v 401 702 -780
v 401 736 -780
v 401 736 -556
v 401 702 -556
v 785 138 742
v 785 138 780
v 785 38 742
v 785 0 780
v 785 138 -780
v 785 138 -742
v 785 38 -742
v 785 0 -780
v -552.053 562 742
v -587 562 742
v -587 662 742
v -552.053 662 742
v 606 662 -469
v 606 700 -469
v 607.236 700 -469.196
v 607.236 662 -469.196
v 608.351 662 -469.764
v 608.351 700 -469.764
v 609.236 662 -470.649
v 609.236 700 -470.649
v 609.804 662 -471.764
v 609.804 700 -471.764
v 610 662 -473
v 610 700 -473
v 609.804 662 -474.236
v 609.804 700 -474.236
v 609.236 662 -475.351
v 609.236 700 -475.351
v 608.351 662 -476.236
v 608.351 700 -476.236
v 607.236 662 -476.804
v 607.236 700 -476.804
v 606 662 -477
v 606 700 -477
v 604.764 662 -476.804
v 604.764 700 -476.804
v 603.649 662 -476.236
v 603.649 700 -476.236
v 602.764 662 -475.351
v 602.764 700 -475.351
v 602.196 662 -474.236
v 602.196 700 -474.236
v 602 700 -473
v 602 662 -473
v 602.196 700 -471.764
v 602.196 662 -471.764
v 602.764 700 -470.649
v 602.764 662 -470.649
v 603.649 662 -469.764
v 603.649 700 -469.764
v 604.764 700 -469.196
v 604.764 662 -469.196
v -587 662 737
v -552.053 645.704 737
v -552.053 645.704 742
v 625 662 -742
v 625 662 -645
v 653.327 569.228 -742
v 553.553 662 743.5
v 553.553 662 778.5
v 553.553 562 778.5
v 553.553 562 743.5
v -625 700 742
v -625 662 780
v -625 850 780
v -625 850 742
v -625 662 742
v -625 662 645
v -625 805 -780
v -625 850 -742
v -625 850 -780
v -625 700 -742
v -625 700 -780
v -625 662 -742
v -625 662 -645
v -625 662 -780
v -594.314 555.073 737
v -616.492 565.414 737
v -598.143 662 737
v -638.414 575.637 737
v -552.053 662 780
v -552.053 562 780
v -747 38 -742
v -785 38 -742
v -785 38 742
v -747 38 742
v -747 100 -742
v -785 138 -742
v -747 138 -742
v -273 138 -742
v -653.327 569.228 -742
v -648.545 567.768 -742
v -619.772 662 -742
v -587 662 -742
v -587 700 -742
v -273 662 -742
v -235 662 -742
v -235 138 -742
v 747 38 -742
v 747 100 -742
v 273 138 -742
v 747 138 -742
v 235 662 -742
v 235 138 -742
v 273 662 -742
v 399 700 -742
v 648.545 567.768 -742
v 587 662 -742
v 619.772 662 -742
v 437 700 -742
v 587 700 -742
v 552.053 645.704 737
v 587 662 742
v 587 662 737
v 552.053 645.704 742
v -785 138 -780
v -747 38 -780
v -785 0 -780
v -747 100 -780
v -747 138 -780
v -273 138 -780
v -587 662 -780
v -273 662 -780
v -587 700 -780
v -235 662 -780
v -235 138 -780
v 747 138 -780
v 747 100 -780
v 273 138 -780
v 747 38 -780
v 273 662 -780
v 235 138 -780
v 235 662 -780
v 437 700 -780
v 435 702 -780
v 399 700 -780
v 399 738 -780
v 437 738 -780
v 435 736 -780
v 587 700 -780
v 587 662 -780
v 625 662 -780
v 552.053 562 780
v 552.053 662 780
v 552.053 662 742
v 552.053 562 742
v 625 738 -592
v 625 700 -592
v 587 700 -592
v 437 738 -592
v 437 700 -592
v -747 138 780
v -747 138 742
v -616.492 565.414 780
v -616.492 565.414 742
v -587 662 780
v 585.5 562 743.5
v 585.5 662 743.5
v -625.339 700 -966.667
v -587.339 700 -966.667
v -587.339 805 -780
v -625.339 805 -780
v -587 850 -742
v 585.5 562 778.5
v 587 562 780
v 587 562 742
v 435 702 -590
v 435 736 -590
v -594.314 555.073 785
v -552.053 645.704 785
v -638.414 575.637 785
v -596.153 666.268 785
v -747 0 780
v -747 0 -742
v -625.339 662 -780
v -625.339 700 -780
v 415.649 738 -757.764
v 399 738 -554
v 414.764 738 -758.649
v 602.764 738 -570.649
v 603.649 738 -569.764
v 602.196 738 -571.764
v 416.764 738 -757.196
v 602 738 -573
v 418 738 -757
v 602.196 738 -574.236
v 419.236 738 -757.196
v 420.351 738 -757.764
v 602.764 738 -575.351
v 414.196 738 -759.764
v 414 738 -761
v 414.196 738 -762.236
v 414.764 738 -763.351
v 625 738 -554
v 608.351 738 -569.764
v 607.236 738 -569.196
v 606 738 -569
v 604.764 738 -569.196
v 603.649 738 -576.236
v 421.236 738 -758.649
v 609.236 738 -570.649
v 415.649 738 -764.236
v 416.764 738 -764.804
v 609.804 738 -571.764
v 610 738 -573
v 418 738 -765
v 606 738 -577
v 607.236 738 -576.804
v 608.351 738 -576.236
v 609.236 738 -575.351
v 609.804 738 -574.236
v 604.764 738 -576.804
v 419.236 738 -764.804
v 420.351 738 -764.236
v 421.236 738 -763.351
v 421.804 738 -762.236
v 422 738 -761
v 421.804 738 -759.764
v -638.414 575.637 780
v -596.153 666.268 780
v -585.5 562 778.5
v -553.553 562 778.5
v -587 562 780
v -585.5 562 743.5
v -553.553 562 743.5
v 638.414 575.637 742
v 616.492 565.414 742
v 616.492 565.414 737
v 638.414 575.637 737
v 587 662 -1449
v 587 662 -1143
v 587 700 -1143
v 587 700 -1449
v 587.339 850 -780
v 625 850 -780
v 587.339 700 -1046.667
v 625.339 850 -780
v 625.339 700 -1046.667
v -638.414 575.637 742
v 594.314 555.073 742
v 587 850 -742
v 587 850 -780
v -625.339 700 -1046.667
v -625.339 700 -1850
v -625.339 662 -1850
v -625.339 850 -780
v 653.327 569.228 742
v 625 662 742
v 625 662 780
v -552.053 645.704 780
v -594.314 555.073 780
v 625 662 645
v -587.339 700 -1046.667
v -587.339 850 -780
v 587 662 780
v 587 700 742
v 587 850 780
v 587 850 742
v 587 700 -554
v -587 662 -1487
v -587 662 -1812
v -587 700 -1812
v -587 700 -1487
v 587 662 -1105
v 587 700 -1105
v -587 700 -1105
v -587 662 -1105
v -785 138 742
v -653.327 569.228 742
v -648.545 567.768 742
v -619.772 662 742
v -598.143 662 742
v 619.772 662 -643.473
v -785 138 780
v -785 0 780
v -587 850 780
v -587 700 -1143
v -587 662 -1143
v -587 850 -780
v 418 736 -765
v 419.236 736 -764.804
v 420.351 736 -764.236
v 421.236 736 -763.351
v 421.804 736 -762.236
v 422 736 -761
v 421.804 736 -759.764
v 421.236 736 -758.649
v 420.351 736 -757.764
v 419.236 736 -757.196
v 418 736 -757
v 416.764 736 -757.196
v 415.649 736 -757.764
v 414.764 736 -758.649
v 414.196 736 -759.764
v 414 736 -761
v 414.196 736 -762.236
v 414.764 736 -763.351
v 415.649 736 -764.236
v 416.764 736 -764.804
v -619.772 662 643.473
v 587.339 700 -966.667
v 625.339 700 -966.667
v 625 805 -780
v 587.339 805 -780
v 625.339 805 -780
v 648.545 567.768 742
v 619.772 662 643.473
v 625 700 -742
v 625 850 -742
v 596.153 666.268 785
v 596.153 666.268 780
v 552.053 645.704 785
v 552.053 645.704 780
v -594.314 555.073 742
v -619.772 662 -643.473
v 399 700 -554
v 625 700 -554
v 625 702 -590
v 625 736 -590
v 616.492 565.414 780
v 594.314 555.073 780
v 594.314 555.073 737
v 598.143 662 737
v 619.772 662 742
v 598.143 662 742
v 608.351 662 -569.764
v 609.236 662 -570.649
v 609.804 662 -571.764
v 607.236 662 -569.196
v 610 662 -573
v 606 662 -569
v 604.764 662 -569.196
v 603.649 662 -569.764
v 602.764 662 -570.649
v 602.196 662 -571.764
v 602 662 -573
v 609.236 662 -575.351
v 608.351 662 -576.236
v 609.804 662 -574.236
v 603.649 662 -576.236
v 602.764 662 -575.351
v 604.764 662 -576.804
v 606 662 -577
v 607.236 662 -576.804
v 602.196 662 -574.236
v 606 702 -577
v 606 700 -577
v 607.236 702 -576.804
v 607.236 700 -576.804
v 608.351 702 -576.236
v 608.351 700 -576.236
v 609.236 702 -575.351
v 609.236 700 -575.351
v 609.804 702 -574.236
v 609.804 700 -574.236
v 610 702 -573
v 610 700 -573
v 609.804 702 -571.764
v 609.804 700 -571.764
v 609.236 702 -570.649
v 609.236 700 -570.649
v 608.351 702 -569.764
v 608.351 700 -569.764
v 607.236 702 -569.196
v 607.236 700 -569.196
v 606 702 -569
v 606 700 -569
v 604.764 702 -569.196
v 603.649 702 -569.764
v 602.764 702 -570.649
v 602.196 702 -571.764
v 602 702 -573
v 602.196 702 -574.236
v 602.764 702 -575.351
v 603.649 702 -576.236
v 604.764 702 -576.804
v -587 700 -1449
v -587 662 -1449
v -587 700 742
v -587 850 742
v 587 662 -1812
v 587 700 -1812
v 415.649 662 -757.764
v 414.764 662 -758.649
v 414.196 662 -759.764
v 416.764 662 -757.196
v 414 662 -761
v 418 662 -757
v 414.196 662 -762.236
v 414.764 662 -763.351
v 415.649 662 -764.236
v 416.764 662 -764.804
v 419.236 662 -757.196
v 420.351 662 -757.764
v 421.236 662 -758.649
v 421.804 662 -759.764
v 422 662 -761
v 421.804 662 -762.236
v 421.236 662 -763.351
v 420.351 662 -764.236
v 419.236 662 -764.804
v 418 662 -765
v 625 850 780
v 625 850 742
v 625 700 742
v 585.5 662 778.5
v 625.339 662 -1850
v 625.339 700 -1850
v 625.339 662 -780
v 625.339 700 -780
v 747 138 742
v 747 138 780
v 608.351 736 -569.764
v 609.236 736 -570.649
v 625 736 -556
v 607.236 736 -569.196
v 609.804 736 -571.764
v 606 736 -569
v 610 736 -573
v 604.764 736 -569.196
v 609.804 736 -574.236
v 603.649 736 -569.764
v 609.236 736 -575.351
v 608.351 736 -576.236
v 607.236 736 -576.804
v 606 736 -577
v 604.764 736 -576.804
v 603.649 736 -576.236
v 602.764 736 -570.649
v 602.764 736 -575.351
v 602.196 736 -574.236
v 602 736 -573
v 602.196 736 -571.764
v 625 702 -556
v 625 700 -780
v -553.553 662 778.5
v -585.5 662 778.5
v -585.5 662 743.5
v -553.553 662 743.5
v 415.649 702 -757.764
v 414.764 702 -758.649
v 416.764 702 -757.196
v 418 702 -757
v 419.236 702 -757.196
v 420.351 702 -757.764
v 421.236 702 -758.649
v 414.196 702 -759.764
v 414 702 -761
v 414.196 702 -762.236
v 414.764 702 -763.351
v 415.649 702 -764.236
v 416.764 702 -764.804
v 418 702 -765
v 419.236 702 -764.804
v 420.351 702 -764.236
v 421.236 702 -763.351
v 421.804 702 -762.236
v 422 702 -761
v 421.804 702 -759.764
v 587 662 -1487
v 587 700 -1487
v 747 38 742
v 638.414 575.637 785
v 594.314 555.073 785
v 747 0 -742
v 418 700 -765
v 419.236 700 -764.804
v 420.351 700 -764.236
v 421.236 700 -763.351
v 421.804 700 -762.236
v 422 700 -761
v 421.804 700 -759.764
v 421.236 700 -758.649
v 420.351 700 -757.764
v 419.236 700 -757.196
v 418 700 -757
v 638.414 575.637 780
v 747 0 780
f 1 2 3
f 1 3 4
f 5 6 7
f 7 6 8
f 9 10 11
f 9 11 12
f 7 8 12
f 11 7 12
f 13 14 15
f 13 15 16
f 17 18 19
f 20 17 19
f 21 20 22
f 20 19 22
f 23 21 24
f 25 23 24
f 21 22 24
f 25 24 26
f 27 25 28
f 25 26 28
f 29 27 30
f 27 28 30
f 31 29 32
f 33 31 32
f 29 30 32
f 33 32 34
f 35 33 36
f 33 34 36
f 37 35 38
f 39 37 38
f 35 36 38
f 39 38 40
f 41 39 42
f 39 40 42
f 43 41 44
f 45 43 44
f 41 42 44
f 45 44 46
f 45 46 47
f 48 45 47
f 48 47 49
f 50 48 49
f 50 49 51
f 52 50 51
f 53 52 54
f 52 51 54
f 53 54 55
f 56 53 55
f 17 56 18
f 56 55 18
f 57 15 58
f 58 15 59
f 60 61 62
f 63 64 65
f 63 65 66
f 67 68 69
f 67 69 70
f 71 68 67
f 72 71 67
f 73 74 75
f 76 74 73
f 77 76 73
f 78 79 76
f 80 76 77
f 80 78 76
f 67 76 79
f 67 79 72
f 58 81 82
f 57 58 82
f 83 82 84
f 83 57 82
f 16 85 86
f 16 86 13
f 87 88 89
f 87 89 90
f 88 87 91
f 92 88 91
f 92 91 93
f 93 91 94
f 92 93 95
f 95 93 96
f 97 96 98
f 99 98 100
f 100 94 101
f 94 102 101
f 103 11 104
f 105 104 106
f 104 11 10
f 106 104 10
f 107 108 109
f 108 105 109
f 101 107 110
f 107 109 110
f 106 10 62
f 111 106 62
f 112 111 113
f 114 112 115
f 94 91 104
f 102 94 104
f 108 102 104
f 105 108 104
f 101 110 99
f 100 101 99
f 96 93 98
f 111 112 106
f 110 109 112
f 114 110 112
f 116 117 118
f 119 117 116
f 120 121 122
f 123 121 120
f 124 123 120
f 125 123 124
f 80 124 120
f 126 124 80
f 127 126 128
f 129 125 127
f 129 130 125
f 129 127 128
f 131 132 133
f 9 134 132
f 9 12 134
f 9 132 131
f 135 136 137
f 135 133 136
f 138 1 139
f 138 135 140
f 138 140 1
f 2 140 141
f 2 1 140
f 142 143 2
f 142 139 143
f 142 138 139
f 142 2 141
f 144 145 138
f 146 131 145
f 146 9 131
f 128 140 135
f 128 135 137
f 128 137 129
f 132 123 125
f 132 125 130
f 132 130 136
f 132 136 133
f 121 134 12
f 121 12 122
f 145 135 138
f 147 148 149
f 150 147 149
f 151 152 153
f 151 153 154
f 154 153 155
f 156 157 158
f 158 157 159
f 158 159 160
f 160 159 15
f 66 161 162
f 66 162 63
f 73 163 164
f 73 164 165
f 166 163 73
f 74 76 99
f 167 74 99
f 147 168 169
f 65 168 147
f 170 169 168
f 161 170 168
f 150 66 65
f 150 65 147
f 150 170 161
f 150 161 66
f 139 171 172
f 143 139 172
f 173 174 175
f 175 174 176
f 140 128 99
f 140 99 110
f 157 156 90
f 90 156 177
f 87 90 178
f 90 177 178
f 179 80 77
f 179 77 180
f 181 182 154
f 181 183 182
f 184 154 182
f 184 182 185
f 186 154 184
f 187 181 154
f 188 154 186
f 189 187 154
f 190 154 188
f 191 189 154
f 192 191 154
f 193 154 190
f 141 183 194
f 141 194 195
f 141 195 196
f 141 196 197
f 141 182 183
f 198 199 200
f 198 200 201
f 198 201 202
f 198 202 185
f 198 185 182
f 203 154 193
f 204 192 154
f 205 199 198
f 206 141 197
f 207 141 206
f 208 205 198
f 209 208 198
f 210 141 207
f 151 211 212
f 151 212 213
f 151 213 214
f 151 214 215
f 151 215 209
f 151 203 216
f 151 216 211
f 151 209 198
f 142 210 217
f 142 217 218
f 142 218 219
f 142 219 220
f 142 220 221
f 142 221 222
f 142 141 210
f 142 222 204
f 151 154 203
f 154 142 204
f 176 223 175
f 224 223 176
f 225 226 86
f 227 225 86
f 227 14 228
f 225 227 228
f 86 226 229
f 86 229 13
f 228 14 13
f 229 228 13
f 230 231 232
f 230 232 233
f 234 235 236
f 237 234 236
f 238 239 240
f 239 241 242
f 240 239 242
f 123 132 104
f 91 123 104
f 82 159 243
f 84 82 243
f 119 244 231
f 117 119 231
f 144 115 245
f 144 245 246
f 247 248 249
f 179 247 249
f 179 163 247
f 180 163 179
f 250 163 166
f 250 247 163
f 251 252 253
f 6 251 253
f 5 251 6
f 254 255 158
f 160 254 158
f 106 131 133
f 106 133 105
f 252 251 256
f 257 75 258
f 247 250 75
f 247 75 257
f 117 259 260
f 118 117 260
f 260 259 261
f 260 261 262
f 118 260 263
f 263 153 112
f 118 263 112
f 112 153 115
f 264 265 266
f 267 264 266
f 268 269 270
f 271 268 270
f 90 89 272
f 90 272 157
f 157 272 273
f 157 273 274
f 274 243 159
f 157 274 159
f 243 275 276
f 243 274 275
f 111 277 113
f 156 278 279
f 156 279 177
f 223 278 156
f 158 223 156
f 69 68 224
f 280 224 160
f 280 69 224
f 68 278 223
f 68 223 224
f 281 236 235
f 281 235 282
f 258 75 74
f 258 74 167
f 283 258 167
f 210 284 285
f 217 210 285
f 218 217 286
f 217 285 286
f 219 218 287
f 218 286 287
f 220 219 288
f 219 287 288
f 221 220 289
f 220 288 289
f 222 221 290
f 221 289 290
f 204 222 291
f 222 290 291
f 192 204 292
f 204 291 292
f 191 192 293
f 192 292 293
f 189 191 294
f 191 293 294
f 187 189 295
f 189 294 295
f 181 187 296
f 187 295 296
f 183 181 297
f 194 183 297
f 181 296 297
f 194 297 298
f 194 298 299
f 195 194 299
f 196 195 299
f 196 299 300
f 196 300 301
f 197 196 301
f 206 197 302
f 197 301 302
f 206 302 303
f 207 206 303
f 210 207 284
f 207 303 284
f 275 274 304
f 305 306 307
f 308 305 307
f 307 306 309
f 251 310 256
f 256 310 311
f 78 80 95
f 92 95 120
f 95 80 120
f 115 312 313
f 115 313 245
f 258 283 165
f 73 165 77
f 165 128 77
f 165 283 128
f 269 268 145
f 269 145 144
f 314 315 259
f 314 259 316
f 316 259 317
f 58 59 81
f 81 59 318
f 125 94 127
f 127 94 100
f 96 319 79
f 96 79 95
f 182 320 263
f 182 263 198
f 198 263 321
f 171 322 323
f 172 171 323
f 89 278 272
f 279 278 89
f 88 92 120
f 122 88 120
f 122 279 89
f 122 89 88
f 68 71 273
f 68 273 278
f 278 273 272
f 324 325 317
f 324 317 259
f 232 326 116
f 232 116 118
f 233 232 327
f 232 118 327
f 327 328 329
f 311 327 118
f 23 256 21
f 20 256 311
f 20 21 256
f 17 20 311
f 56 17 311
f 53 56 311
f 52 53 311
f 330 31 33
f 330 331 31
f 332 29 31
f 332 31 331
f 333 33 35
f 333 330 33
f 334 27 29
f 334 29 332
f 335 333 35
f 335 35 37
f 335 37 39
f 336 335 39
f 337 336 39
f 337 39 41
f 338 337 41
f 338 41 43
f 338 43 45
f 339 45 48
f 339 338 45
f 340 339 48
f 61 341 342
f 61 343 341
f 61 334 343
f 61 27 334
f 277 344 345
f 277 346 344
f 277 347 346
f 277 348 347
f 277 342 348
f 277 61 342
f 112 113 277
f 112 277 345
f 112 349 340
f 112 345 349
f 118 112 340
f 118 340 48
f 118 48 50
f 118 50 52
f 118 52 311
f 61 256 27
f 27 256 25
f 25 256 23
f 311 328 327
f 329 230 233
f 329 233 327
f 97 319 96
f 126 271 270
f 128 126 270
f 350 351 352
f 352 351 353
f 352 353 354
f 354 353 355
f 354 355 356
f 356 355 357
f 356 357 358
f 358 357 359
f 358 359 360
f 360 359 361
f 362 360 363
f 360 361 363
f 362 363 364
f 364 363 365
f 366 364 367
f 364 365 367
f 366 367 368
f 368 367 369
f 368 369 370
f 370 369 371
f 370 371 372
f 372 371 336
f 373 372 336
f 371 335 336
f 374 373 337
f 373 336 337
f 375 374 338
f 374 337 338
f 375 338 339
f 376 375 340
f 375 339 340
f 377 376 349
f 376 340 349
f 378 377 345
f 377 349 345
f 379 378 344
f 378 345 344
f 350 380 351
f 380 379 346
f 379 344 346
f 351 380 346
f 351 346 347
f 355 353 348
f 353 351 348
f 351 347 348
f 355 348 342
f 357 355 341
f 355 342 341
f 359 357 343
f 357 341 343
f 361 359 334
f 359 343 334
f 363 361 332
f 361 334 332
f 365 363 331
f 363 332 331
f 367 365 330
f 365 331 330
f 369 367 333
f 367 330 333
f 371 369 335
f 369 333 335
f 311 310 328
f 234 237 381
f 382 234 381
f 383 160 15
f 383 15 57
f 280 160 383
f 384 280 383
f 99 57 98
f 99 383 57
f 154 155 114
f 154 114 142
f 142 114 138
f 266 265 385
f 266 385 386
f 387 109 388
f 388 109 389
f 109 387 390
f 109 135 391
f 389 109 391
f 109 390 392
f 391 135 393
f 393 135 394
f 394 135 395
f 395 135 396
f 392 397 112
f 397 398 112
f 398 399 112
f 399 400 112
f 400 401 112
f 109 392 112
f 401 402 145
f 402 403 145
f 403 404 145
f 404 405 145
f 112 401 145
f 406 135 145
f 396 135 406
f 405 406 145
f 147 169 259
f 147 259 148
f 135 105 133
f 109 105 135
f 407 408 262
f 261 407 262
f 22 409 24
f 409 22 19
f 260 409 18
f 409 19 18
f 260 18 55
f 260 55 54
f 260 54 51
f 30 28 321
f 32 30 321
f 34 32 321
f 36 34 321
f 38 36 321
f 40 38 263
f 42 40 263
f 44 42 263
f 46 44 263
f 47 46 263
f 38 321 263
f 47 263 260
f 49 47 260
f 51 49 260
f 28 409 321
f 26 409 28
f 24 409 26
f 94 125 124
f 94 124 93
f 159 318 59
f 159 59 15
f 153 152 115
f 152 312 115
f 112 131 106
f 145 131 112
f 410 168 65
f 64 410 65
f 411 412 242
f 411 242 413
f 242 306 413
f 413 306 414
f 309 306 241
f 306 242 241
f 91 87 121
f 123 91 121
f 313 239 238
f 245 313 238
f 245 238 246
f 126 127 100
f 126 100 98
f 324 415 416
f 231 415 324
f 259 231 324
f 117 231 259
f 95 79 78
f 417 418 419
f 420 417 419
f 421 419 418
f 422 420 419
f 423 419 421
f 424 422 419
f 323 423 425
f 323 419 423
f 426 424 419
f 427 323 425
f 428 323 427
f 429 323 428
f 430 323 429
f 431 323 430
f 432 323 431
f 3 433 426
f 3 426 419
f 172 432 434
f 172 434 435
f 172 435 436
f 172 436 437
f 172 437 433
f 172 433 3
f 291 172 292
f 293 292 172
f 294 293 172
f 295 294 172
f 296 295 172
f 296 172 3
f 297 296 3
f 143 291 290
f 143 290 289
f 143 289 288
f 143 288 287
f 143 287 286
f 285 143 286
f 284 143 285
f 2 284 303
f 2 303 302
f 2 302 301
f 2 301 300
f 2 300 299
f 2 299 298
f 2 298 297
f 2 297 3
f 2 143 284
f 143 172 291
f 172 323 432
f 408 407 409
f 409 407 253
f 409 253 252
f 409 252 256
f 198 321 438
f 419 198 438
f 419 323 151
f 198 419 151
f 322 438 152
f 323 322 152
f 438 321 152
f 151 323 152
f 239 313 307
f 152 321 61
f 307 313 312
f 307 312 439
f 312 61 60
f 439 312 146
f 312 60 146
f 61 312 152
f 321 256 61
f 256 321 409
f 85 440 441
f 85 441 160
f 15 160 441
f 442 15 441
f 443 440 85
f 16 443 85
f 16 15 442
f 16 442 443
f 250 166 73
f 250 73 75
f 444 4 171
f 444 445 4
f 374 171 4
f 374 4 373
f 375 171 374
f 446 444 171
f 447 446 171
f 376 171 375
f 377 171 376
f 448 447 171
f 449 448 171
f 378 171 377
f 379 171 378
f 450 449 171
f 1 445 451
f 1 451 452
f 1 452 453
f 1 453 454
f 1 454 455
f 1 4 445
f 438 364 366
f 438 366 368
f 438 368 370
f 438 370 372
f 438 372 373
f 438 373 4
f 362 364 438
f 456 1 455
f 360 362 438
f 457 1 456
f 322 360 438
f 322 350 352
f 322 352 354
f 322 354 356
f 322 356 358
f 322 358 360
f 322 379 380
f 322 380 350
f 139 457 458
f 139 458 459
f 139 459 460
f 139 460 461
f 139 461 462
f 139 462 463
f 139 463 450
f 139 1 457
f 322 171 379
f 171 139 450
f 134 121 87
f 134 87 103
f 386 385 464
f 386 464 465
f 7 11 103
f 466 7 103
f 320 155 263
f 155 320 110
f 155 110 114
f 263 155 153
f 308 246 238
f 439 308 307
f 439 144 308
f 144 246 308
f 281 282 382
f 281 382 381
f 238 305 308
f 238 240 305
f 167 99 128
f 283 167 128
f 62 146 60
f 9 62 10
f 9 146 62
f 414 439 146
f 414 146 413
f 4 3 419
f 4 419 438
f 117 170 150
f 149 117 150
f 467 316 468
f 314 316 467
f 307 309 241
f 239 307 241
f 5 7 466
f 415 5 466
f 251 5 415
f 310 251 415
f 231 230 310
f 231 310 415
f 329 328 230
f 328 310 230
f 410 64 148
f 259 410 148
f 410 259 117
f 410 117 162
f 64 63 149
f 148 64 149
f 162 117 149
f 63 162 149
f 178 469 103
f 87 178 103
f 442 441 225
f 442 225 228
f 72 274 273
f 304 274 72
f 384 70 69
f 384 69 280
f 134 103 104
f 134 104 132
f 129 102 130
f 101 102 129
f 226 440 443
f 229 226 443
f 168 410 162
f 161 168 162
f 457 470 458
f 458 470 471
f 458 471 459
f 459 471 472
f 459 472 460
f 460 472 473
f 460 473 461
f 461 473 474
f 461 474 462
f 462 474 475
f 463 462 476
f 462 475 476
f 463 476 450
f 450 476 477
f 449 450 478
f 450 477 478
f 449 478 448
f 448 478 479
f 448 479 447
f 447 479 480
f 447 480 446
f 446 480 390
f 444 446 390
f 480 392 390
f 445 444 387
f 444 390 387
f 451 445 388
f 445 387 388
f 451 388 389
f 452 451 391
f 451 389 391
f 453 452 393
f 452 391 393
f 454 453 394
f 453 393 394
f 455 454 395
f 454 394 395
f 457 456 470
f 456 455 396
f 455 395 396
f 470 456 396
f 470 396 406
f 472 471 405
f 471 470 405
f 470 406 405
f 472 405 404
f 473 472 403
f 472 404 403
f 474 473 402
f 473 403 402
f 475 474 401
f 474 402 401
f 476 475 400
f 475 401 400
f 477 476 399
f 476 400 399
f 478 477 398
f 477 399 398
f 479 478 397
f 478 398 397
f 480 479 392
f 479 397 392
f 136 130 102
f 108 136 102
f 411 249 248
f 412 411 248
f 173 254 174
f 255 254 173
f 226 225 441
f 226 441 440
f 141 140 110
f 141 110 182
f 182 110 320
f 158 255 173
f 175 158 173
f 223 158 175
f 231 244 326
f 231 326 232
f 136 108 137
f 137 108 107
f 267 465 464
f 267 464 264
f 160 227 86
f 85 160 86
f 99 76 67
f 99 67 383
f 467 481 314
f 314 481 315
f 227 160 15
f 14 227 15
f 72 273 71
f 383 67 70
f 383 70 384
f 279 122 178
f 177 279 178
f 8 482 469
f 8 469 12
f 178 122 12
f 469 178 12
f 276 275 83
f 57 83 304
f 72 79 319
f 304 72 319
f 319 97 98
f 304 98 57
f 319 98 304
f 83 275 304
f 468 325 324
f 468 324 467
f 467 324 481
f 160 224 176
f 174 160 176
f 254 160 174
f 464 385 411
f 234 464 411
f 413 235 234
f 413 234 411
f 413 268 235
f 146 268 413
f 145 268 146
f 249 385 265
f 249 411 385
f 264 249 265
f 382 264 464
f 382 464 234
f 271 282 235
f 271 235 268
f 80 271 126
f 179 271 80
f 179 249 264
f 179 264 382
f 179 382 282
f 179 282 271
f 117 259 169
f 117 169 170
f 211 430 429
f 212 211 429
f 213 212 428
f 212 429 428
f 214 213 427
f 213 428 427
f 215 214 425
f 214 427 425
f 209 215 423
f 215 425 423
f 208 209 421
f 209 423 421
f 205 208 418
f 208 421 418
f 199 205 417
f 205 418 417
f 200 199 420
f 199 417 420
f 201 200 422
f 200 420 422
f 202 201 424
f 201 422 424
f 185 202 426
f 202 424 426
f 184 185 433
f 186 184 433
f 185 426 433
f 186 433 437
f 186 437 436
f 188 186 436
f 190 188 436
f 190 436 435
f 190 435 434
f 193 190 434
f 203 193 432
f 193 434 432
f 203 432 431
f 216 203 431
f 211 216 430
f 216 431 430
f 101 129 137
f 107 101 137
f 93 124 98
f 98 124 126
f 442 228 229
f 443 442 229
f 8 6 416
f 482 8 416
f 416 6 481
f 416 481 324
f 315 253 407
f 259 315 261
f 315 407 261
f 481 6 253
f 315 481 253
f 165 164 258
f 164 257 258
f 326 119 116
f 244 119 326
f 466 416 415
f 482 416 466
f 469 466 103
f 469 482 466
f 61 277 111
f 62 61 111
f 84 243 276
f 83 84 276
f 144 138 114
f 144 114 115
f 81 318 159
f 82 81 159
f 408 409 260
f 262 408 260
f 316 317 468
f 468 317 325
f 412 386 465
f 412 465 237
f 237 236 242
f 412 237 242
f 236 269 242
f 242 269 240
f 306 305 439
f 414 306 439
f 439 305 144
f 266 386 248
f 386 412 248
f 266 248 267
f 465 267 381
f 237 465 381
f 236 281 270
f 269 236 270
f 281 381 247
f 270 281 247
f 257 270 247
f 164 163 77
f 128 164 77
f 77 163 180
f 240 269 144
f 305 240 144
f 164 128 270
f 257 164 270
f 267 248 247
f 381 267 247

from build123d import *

# Parameters (mm, degrees)
EXTRUDE_THIN1_DEPTH  = 38
SKETCH3_W            = 38
SKETCH3_H            = 38
BOSS_EXTRUDE1_DEPTH  = 100
EXTRUDE_THIN2_DEPTH  = 38
SWEEP1_START         = 742
SWEEP1_DEPTH         = 38
SWEEP2_START         = 742
SWEEP2_DEPTH         = 38
SWEEP3_START         = -780
SWEEP3_DEPTH         = 38
SWEEP4_START         = -780
SWEEP4_DEPTH         = 38
SKETCH13_W           = 38
SKETCH13_H           = 38
BOSS_EXTRUDE2_DEPTH  = 150
RIB1_REACH           = 1837.226
SKETCH16_WALL_W      = 3809.630165696
SKETCH16_WALL_H      = 5
RIB2_REACH           = 1837.226
SKETCH21_WALL_W      = 3809.630165696
SKETCH21_WALL_H      = 5
SKETCH25_W           = 935.216872936
SKETCH25_H           = 953.548523314
CUT_EXTRUDE1_DEPTH   = 1943.247409575
SKETCH26_W           = 38
SKETCH26_H           = 38
SKETCH26_W_2         = 38.33862028
BOSS_EXTRUDE3_DEPTH  = 1070
BOSS_EXTRUDE4_REACH  = 2457.073
SKETCH27_W           = 38
SKETCH27_H           = 38
BOSS_EXTRUDE5_DEPTH  = 38
SKETCH29_W           = 38
SKETCH29_H           = 624
EXTRUDE_THIN3_DEPTH  = 38
SKETCH30_W           = 38
SKETCH30_H           = 624
EXTRUDE_THIN4_DEPTH  = 38
SKETCH31_W           = 1174
SKETCH31_H           = 38
EXTRUDE_THIN5_DEPTH  = 38
BOSS_EXTRUDE6_DEPTH  = 38
BOSS_EXTRUDE7_DEPTH  = 5
BOSS_EXTRUDE8_DEPTH  = 5
SKETCH35_W           = 34.947405688
SKETCH35_H           = 38
BOSS_EXTRUDE11_DEPTH = 100
SHELL1_T             = -1.5
SKETCH36_W           = 943.118643106
SKETCH36_H           = 1032.640089362
CUT_EXTRUDE2_DEPTH   = 2878.837729963
SKETCH38_R           = 4
CUT_EXTRUDE3_DEPTH   = 38
SKETCH40_W           = 31.947405688
SKETCH40_H           = 35
CUT_EXTRUDE5_DEPTH   = 2087.760407905
SKETCH41_W           = 31.947405688
SKETCH41_H           = 35
CUT_EXTRUDE6_DEPTH   = 2087.760407905
EXTRUDE_THIN7_DEPTH  = 38
SKETCH43_R           = 4
CUT_EXTRUDE7_DEPTH   = 2116.884921256
SKETCH45_W           = 34
SKETCH45_H           = 34
SKETCH49_W           = 38
SKETCH49_H           = 38
BOSS_EXTRUDE12_DEPTH = 1494
SKETCH50_W           = 38
SKETCH50_H           = 62
CUT_EXTRUDE8_DEPTH   = 1916.842895438


# Read off the part's stored shape, not the designer's step: Sweep1, Sweep2, Sweep3, Sweep4
with BuildPart() as part:
    # Sketch2 → Extrude-Thin1 (new body)
    with BuildSketch(Plane(origin=(0, 0, 0), x_dir=(1, 0, 0), z_dir=(0, 1, 0))):
        Polygon((785, -780), (785, 780), (-785, 780), (-785, -780), (-747, -780), (-747, 742), (747, 742), (747, -780), align=None)
    extrude(amount=EXTRUDE_THIN1_DEPTH)

    # Sketch3 → Boss-Extrude1 (add)
    with BuildSketch(Plane(origin=(0, 38, 0), x_dir=(1, 0, 0), z_dir=(0, 1, 0))):
        with Locations((-766, 761)):
            Rectangle(SKETCH3_W, SKETCH3_H)
        with Locations((766, 761)):
            Rectangle(SKETCH3_W, SKETCH3_H)
        with Locations((766, -761)):
            Rectangle(SKETCH3_W, SKETCH3_H)
        with Locations((-766, -761)):
            Rectangle(SKETCH3_W, SKETCH3_H)
    extrude(amount=BOSS_EXTRUDE1_DEPTH)



with BuildPart() as body_2:
    # Sketch4 → Extrude-Thin2 (new body)
    with BuildSketch(Plane(origin=(0, 700, 0), x_dir=(1, 0, 0), z_dir=(0, 1, 0))):
        Polygon((625, -780), (625, 780), (-625, 780), (-625, -780), (-587, -780), (-587, 742), (587, 742), (587, -780), align=None)
    extrude(amount=-EXTRUDE_THIN2_DEPTH)


with BuildPart() as part_1:
    add(part.part)

    add(body_2.part)  # Sweep1 merges body 2
    # Sweep1 outline → Sweep1 (add)
    with BuildSketch(Plane.XY.offset(SWEEP1_START)):
        Polygon((-587, 662), (-625, 662), (-785, 138), (-747, 138), align=None)
    extrude(amount=SWEEP1_DEPTH)

    # Sweep2 outline → Sweep2 (add)
    with BuildSketch(Plane.XY.offset(SWEEP2_START)):
        Polygon((747, 138), (785, 138), (625, 662), (587, 662), align=None)
    extrude(amount=SWEEP2_DEPTH)

    # Sweep3 outline → Sweep3 (add)
    with BuildSketch(Plane.XY.offset(SWEEP3_START)):
        Polygon((785, 138), (625, 662), (587, 662), (747, 138), align=None)
    extrude(amount=SWEEP3_DEPTH)

    # Sweep4 outline → Sweep4 (add)
    with BuildSketch(Plane.XY.offset(SWEEP4_START)):
        Polygon((-625, 662), (-785, 138), (-747, 138), (-587, 662), align=None)
    extrude(amount=SWEEP4_DEPTH)

    # Sketch13 → Boss-Extrude2 (add)
    with BuildSketch(Plane(origin=(0, 700, 0), x_dir=(1, 0, 0), z_dir=(0, 1, 0))):
        with Locations((-606, 761)):
            Rectangle(SKETCH13_W, SKETCH13_H)
        with Locations((-606, -761)):
            Rectangle(SKETCH13_W, SKETCH13_H)
        with Locations((606, 761)):
            Rectangle(SKETCH13_W, SKETCH13_H)
        with Locations((606, -761)):
            Rectangle(SKETCH13_W, SKETCH13_H)
    extrude(amount=BOSS_EXTRUDE2_DEPTH)

    # Sketch16 wall → Rib1 (add, up to next)
    with BuildSketch(Plane(origin=(-639.163602773, 615.614200918, 693.5), x_dir=(0.20649854777, 0.676282743952, -0.707106781188), z_dir=(-0.206498547772, -0.676282743954, -0.707106781186)), mode=Mode.PRIVATE) as rib1_sk1:
        with Locations((0, 2.5)):
            Rectangle(SKETCH16_WALL_W, SKETCH16_WALL_H)
    rib1_tool1 = extrude(rib1_sk1.sketch, amount=-RIB1_REACH, mode=Mode.PRIVATE) - part_1.part
    add(rib1_tool1.solids().sort_by_distance((-639.163602773, 615.614200918, 693.5))[0])

    # Sketch21 wall → Rib2 (add, up to next)
    with BuildSketch(Plane(origin=(-639.163602773, 615.614200918, -693.5), x_dir=(-0.20649854777, -0.676282743952, -0.707106781188), z_dir=(-0.206498547772, -0.676282743954, 0.707106781186)), mode=Mode.PRIVATE) as rib2_sk1:
        with Locations((0, 2.5)):
            Rectangle(SKETCH21_WALL_W, SKETCH21_WALL_H)
    rib2_tool1 = extrude(rib2_sk1.sketch, amount=-RIB2_REACH, mode=Mode.PRIVATE) - part_1.part
    add(rib2_tool1.solids().sort_by_distance((-639.163602773, 615.614200918, -693.5))[0])

    # Sketch25 → Cut-Extrude1 (cut, through all)
    with BuildSketch(Plane.XY.offset(780)):
        with Locations((467.608436468, 476.774261657)):
            Rectangle(SKETCH25_W, SKETCH25_H)
    extrude(amount=-CUT_EXTRUDE1_DEPTH, mode=Mode.SUBTRACT)

    # Mirror12: part across plane


with BuildPart() as part_2:
    add(part_1.part)
    add(part_1.part.mirror(Plane(origin=(0, 0, -780), x_dir=(0, 0, 1), z_dir=(-1, 0, 0))))

    # Sketch26 → Boss-Extrude3 (add)
    with BuildSketch(Plane(origin=(0, 0, -780), x_dir=(-1, 0, 0), z_dir=(0, 0, -1))):
        with Locations((-606, 681)):
            Rectangle(SKETCH26_W, SKETCH26_H)
        with Locations((606.16931014, 681)):
            Rectangle(SKETCH26_W_2, SKETCH26_H)
    extrude(amount=BOSS_EXTRUDE3_DEPTH)

    # Sketch27 → Boss-Extrude4 (add, up to next)
    with BuildSketch(Plane.ZY.offset(-587), mode=Mode.PRIVATE) as boss_extrude4_sk1:
        with Locations((-1831, 681)):
            Rectangle(SKETCH27_W, SKETCH27_H)
    boss_extrude4_tool1 = extrude(boss_extrude4_sk1.sketch, amount=BOSS_EXTRUDE4_REACH, mode=Mode.PRIVATE) - part_2.part
    add(boss_extrude4_tool1.solids().sort_by_distance((587, 681, -1831))[0])

    # Sketch28 → Boss-Extrude5 (add)
    with BuildSketch(Plane.ZY.offset(625.33862028)):
        Polygon((-780, 850), (-1046.666666667, 700), (-966.666666667, 700), (-780, 805), align=None)
    extrude(amount=-BOSS_EXTRUDE5_DEPTH)

    # Sketch29 → Extrude-Thin3 (add)
    with BuildSketch(Plane.XY.offset(-742)):
        with Locations((-254, 350)):
            Rectangle(SKETCH29_W, SKETCH29_H)
    extrude(amount=-EXTRUDE_THIN3_DEPTH)

    # Sketch31 → Extrude-Thin5 (add)
    with BuildSketch(Plane(origin=(0, 700, 0), x_dir=(1, 0, 0), z_dir=(0, 1, 0))):
        with Locations((0, 1468)):
            Rectangle(SKETCH31_W, SKETCH31_H)
        with Locations((0, 1124)):
            Rectangle(SKETCH31_W, SKETCH31_H)
    extrude(amount=-EXTRUDE_THIN5_DEPTH)

    # Sketch32 → Boss-Extrude6 (add)
    with BuildSketch(Plane(origin=(625, 0, 0), x_dir=(0, 0, -1), z_dir=(1, 0, 0))):
        Polygon((1046.666666667, 700), (780, 850), (780, 805), (966.666666667, 700), align=None)
    extrude(amount=-BOSS_EXTRUDE6_DEPTH)

    # Sketch33 → Boss-Extrude7 (add)
    with BuildSketch(Plane.XY.offset(780)):
        Polygon((-596.152601999, 666.267928404), (-552.052594312, 645.703757095), (-594.314420486, 555.072978391), (-638.414428173, 575.637149701), align=None)
    extrude(amount=BOSS_EXTRUDE7_DEPTH)

    # Sketch34 → Boss-Extrude8 (add)
    with BuildSketch(Plane(origin=(0, 0, 742), x_dir=(-1, 0, 0), z_dir=(0, 0, -1))):
        Polygon((594.314420486, 555.072978391), (616.491771856, 565.414447173), (587, 662), (552.052594312, 645.703757095), align=None)
        Polygon((616.491771856, 565.414447173), (638.414428173, 575.637149701), (598.142769699, 662), (587, 662), align=None)
    extrude(amount=BOSS_EXTRUDE8_DEPTH)


with BuildPart() as body_2_2:
    # Sketch30 → Extrude-Thin4 (new body)
    with BuildSketch(Plane.XY.offset(-742)):
        with Locations((254, 350)):
            Rectangle(SKETCH30_W, SKETCH30_H)
    extrude(amount=-EXTRUDE_THIN4_DEPTH)


with BuildPart() as body_3:
    # Sketch35 → Boss-Extrude11 (new body)
    with BuildSketch(Plane(origin=(0, 662, 0), x_dir=(1, 0, 0), z_dir=(0, 1, 0))):
        with Locations((-569.526297156, -761)):
            Rectangle(SKETCH35_W, SKETCH35_H)
    extrude(amount=-BOSS_EXTRUDE11_DEPTH)

    # Shell1
    shell1_openings = [body_3.faces().sort_by_distance(p)[0] for p in [
        (-569.526297156, 662, 761),
    ]]
    offset(amount=SHELL1_T, openings=shell1_openings, kind=Kind.INTERSECTION)


with BuildPart() as cut_extrude2_tool:
    # Sketch36 → Cut-Extrude2 (new, through all)
    with BuildSketch(Plane.XY.offset(785)):
        with Locations((471.559321553, 516.320044681)):
            Rectangle(SKETCH36_W, SKETCH36_H)
    extrude(amount=-CUT_EXTRUDE2_DEPTH)


with BuildPart() as part_3:
    add(part_2.part)

    # Cut-Extrude2: cut by cut_extrude2_tool
    add(cut_extrude2_tool.part, mode=Mode.SUBTRACT)


with BuildPart() as body_2_2_1:
    add(body_2_2.part)

    # Cut-Extrude2: cut by cut_extrude2_tool
    add(cut_extrude2_tool.part, mode=Mode.SUBTRACT)


with BuildPart() as body_3_2:
    # Mirror13: mirrored copy
    add(part_3.part.mirror(Plane(origin=(0, 0, -1850), x_dir=(0, 0, 1), z_dir=(-1, 0, 0))))

    # Sketch38 → Cut-Extrude3 (cut)
    with BuildSketch(Plane(origin=(0, 700, 0), x_dir=(1, 0, 0), z_dir=(0, 1, 0))):
        with Locations(Location((418, 761, 0), (0, 0, 270))):
            Circle(SKETCH38_R)
        with Locations(Location((606, 573, 0), (0, 0, 270))):
            Circle(SKETCH38_R)
        with Locations(Location((606, 473, 0), (0, 0, 270))):
            Circle(SKETCH38_R)
    extrude(amount=-CUT_EXTRUDE3_DEPTH, mode=Mode.SUBTRACT)

    # Sketch42 → Extrude-Thin7 (add)
    with BuildSketch(Plane(origin=(0, 700, 0), x_dir=(1, 0, 0), z_dir=(0, 1, 0))):
        Polygon((399, 780), (399, 554), (625, 554), (625, 592), (437, 592), (437, 780), align=None)
    extrude(amount=EXTRUDE_THIN7_DEPTH)

    # Sketch43 → Cut-Extrude7 (cut, through all)
    with BuildSketch(Plane.XZ.offset(-662)):
        with Locations(Location((606, -573, 0), (0, 0, 270))):
            Circle(SKETCH43_R)
        with Locations(Location((418, -761, 0), (0, 0, 270))):
            Circle(SKETCH43_R)
    extrude(amount=-CUT_EXTRUDE7_DEPTH, mode=Mode.SUBTRACT)

    # Cut-Sweep3: sweep along a path in Sketch48
    with BuildLine(Plane(origin=(0, 712.5, 0), x_dir=(1, 0, 0), z_dir=(0, 1, 0))) as cut_sweep3_path:
        Line((625, 573), (418, 573))
        Line((418, 573), (418, 780))
    # Sketch45 → Cut-Sweep3 (sweep, cut)
    with BuildSketch(Plane(origin=(625, 0, 0), x_dir=(0, 0, -1), z_dir=(1, 0, 0))):
        with Locations((573, 719)):
            Rectangle(SKETCH45_W, SKETCH45_H)
    sweep(path=cut_sweep3_path.line, transition=Transition.RIGHT, mode=Mode.SUBTRACT)


with BuildPart() as body_4:
    # Mirror13 2: mirrored copy
    add(body_3.part.mirror(Plane(origin=(0, 0, -1850), x_dir=(0, 0, 1), z_dir=(-1, 0, 0))))

    # Sketch41 → Cut-Extrude6 (cut, through all)
    with BuildSketch(Plane.XZ.offset(-562)):
        with Locations((569.526297156, 761)):
            Rectangle(SKETCH41_W, SKETCH41_H)
    extrude(amount=-CUT_EXTRUDE6_DEPTH, mode=Mode.SUBTRACT)


with BuildPart() as body_3_1:
    add(body_3.part)

    # Sketch40 → Cut-Extrude5 (cut, through all)
    with BuildSketch(Plane.XZ.offset(-562)):
        with Locations((-569.526297156, 761)):
            Rectangle(SKETCH40_W, SKETCH40_H)
    extrude(amount=-CUT_EXTRUDE5_DEPTH, mode=Mode.SUBTRACT)


with BuildPart() as part_4:
    add(part_3.part)

    add(body_3_2.part)  # Boss-Extrude12 merges body 3 2
    # Sketch49 → Boss-Extrude12 (add)
    with BuildSketch(Plane.ZY.offset(-747)):
        with Locations((-761, 119)):
            Rectangle(SKETCH49_W, SKETCH49_H)
    extrude(amount=BOSS_EXTRUDE12_DEPTH)

    # Sketch50 → Cut-Extrude8 (cut, through all)
    with BuildSketch(Plane.XY.offset(-742)):
        with Locations((-254, 69)):
            Rectangle(SKETCH50_W, SKETCH50_H)
        with Locations((254, 69)):
            Rectangle(SKETCH50_W, SKETCH50_H)
    extrude(amount=-CUT_EXTRUDE8_DEPTH, mode=Mode.SUBTRACT)


solid = Compound([body_4.part, body_3_1.part, part_4.part])
